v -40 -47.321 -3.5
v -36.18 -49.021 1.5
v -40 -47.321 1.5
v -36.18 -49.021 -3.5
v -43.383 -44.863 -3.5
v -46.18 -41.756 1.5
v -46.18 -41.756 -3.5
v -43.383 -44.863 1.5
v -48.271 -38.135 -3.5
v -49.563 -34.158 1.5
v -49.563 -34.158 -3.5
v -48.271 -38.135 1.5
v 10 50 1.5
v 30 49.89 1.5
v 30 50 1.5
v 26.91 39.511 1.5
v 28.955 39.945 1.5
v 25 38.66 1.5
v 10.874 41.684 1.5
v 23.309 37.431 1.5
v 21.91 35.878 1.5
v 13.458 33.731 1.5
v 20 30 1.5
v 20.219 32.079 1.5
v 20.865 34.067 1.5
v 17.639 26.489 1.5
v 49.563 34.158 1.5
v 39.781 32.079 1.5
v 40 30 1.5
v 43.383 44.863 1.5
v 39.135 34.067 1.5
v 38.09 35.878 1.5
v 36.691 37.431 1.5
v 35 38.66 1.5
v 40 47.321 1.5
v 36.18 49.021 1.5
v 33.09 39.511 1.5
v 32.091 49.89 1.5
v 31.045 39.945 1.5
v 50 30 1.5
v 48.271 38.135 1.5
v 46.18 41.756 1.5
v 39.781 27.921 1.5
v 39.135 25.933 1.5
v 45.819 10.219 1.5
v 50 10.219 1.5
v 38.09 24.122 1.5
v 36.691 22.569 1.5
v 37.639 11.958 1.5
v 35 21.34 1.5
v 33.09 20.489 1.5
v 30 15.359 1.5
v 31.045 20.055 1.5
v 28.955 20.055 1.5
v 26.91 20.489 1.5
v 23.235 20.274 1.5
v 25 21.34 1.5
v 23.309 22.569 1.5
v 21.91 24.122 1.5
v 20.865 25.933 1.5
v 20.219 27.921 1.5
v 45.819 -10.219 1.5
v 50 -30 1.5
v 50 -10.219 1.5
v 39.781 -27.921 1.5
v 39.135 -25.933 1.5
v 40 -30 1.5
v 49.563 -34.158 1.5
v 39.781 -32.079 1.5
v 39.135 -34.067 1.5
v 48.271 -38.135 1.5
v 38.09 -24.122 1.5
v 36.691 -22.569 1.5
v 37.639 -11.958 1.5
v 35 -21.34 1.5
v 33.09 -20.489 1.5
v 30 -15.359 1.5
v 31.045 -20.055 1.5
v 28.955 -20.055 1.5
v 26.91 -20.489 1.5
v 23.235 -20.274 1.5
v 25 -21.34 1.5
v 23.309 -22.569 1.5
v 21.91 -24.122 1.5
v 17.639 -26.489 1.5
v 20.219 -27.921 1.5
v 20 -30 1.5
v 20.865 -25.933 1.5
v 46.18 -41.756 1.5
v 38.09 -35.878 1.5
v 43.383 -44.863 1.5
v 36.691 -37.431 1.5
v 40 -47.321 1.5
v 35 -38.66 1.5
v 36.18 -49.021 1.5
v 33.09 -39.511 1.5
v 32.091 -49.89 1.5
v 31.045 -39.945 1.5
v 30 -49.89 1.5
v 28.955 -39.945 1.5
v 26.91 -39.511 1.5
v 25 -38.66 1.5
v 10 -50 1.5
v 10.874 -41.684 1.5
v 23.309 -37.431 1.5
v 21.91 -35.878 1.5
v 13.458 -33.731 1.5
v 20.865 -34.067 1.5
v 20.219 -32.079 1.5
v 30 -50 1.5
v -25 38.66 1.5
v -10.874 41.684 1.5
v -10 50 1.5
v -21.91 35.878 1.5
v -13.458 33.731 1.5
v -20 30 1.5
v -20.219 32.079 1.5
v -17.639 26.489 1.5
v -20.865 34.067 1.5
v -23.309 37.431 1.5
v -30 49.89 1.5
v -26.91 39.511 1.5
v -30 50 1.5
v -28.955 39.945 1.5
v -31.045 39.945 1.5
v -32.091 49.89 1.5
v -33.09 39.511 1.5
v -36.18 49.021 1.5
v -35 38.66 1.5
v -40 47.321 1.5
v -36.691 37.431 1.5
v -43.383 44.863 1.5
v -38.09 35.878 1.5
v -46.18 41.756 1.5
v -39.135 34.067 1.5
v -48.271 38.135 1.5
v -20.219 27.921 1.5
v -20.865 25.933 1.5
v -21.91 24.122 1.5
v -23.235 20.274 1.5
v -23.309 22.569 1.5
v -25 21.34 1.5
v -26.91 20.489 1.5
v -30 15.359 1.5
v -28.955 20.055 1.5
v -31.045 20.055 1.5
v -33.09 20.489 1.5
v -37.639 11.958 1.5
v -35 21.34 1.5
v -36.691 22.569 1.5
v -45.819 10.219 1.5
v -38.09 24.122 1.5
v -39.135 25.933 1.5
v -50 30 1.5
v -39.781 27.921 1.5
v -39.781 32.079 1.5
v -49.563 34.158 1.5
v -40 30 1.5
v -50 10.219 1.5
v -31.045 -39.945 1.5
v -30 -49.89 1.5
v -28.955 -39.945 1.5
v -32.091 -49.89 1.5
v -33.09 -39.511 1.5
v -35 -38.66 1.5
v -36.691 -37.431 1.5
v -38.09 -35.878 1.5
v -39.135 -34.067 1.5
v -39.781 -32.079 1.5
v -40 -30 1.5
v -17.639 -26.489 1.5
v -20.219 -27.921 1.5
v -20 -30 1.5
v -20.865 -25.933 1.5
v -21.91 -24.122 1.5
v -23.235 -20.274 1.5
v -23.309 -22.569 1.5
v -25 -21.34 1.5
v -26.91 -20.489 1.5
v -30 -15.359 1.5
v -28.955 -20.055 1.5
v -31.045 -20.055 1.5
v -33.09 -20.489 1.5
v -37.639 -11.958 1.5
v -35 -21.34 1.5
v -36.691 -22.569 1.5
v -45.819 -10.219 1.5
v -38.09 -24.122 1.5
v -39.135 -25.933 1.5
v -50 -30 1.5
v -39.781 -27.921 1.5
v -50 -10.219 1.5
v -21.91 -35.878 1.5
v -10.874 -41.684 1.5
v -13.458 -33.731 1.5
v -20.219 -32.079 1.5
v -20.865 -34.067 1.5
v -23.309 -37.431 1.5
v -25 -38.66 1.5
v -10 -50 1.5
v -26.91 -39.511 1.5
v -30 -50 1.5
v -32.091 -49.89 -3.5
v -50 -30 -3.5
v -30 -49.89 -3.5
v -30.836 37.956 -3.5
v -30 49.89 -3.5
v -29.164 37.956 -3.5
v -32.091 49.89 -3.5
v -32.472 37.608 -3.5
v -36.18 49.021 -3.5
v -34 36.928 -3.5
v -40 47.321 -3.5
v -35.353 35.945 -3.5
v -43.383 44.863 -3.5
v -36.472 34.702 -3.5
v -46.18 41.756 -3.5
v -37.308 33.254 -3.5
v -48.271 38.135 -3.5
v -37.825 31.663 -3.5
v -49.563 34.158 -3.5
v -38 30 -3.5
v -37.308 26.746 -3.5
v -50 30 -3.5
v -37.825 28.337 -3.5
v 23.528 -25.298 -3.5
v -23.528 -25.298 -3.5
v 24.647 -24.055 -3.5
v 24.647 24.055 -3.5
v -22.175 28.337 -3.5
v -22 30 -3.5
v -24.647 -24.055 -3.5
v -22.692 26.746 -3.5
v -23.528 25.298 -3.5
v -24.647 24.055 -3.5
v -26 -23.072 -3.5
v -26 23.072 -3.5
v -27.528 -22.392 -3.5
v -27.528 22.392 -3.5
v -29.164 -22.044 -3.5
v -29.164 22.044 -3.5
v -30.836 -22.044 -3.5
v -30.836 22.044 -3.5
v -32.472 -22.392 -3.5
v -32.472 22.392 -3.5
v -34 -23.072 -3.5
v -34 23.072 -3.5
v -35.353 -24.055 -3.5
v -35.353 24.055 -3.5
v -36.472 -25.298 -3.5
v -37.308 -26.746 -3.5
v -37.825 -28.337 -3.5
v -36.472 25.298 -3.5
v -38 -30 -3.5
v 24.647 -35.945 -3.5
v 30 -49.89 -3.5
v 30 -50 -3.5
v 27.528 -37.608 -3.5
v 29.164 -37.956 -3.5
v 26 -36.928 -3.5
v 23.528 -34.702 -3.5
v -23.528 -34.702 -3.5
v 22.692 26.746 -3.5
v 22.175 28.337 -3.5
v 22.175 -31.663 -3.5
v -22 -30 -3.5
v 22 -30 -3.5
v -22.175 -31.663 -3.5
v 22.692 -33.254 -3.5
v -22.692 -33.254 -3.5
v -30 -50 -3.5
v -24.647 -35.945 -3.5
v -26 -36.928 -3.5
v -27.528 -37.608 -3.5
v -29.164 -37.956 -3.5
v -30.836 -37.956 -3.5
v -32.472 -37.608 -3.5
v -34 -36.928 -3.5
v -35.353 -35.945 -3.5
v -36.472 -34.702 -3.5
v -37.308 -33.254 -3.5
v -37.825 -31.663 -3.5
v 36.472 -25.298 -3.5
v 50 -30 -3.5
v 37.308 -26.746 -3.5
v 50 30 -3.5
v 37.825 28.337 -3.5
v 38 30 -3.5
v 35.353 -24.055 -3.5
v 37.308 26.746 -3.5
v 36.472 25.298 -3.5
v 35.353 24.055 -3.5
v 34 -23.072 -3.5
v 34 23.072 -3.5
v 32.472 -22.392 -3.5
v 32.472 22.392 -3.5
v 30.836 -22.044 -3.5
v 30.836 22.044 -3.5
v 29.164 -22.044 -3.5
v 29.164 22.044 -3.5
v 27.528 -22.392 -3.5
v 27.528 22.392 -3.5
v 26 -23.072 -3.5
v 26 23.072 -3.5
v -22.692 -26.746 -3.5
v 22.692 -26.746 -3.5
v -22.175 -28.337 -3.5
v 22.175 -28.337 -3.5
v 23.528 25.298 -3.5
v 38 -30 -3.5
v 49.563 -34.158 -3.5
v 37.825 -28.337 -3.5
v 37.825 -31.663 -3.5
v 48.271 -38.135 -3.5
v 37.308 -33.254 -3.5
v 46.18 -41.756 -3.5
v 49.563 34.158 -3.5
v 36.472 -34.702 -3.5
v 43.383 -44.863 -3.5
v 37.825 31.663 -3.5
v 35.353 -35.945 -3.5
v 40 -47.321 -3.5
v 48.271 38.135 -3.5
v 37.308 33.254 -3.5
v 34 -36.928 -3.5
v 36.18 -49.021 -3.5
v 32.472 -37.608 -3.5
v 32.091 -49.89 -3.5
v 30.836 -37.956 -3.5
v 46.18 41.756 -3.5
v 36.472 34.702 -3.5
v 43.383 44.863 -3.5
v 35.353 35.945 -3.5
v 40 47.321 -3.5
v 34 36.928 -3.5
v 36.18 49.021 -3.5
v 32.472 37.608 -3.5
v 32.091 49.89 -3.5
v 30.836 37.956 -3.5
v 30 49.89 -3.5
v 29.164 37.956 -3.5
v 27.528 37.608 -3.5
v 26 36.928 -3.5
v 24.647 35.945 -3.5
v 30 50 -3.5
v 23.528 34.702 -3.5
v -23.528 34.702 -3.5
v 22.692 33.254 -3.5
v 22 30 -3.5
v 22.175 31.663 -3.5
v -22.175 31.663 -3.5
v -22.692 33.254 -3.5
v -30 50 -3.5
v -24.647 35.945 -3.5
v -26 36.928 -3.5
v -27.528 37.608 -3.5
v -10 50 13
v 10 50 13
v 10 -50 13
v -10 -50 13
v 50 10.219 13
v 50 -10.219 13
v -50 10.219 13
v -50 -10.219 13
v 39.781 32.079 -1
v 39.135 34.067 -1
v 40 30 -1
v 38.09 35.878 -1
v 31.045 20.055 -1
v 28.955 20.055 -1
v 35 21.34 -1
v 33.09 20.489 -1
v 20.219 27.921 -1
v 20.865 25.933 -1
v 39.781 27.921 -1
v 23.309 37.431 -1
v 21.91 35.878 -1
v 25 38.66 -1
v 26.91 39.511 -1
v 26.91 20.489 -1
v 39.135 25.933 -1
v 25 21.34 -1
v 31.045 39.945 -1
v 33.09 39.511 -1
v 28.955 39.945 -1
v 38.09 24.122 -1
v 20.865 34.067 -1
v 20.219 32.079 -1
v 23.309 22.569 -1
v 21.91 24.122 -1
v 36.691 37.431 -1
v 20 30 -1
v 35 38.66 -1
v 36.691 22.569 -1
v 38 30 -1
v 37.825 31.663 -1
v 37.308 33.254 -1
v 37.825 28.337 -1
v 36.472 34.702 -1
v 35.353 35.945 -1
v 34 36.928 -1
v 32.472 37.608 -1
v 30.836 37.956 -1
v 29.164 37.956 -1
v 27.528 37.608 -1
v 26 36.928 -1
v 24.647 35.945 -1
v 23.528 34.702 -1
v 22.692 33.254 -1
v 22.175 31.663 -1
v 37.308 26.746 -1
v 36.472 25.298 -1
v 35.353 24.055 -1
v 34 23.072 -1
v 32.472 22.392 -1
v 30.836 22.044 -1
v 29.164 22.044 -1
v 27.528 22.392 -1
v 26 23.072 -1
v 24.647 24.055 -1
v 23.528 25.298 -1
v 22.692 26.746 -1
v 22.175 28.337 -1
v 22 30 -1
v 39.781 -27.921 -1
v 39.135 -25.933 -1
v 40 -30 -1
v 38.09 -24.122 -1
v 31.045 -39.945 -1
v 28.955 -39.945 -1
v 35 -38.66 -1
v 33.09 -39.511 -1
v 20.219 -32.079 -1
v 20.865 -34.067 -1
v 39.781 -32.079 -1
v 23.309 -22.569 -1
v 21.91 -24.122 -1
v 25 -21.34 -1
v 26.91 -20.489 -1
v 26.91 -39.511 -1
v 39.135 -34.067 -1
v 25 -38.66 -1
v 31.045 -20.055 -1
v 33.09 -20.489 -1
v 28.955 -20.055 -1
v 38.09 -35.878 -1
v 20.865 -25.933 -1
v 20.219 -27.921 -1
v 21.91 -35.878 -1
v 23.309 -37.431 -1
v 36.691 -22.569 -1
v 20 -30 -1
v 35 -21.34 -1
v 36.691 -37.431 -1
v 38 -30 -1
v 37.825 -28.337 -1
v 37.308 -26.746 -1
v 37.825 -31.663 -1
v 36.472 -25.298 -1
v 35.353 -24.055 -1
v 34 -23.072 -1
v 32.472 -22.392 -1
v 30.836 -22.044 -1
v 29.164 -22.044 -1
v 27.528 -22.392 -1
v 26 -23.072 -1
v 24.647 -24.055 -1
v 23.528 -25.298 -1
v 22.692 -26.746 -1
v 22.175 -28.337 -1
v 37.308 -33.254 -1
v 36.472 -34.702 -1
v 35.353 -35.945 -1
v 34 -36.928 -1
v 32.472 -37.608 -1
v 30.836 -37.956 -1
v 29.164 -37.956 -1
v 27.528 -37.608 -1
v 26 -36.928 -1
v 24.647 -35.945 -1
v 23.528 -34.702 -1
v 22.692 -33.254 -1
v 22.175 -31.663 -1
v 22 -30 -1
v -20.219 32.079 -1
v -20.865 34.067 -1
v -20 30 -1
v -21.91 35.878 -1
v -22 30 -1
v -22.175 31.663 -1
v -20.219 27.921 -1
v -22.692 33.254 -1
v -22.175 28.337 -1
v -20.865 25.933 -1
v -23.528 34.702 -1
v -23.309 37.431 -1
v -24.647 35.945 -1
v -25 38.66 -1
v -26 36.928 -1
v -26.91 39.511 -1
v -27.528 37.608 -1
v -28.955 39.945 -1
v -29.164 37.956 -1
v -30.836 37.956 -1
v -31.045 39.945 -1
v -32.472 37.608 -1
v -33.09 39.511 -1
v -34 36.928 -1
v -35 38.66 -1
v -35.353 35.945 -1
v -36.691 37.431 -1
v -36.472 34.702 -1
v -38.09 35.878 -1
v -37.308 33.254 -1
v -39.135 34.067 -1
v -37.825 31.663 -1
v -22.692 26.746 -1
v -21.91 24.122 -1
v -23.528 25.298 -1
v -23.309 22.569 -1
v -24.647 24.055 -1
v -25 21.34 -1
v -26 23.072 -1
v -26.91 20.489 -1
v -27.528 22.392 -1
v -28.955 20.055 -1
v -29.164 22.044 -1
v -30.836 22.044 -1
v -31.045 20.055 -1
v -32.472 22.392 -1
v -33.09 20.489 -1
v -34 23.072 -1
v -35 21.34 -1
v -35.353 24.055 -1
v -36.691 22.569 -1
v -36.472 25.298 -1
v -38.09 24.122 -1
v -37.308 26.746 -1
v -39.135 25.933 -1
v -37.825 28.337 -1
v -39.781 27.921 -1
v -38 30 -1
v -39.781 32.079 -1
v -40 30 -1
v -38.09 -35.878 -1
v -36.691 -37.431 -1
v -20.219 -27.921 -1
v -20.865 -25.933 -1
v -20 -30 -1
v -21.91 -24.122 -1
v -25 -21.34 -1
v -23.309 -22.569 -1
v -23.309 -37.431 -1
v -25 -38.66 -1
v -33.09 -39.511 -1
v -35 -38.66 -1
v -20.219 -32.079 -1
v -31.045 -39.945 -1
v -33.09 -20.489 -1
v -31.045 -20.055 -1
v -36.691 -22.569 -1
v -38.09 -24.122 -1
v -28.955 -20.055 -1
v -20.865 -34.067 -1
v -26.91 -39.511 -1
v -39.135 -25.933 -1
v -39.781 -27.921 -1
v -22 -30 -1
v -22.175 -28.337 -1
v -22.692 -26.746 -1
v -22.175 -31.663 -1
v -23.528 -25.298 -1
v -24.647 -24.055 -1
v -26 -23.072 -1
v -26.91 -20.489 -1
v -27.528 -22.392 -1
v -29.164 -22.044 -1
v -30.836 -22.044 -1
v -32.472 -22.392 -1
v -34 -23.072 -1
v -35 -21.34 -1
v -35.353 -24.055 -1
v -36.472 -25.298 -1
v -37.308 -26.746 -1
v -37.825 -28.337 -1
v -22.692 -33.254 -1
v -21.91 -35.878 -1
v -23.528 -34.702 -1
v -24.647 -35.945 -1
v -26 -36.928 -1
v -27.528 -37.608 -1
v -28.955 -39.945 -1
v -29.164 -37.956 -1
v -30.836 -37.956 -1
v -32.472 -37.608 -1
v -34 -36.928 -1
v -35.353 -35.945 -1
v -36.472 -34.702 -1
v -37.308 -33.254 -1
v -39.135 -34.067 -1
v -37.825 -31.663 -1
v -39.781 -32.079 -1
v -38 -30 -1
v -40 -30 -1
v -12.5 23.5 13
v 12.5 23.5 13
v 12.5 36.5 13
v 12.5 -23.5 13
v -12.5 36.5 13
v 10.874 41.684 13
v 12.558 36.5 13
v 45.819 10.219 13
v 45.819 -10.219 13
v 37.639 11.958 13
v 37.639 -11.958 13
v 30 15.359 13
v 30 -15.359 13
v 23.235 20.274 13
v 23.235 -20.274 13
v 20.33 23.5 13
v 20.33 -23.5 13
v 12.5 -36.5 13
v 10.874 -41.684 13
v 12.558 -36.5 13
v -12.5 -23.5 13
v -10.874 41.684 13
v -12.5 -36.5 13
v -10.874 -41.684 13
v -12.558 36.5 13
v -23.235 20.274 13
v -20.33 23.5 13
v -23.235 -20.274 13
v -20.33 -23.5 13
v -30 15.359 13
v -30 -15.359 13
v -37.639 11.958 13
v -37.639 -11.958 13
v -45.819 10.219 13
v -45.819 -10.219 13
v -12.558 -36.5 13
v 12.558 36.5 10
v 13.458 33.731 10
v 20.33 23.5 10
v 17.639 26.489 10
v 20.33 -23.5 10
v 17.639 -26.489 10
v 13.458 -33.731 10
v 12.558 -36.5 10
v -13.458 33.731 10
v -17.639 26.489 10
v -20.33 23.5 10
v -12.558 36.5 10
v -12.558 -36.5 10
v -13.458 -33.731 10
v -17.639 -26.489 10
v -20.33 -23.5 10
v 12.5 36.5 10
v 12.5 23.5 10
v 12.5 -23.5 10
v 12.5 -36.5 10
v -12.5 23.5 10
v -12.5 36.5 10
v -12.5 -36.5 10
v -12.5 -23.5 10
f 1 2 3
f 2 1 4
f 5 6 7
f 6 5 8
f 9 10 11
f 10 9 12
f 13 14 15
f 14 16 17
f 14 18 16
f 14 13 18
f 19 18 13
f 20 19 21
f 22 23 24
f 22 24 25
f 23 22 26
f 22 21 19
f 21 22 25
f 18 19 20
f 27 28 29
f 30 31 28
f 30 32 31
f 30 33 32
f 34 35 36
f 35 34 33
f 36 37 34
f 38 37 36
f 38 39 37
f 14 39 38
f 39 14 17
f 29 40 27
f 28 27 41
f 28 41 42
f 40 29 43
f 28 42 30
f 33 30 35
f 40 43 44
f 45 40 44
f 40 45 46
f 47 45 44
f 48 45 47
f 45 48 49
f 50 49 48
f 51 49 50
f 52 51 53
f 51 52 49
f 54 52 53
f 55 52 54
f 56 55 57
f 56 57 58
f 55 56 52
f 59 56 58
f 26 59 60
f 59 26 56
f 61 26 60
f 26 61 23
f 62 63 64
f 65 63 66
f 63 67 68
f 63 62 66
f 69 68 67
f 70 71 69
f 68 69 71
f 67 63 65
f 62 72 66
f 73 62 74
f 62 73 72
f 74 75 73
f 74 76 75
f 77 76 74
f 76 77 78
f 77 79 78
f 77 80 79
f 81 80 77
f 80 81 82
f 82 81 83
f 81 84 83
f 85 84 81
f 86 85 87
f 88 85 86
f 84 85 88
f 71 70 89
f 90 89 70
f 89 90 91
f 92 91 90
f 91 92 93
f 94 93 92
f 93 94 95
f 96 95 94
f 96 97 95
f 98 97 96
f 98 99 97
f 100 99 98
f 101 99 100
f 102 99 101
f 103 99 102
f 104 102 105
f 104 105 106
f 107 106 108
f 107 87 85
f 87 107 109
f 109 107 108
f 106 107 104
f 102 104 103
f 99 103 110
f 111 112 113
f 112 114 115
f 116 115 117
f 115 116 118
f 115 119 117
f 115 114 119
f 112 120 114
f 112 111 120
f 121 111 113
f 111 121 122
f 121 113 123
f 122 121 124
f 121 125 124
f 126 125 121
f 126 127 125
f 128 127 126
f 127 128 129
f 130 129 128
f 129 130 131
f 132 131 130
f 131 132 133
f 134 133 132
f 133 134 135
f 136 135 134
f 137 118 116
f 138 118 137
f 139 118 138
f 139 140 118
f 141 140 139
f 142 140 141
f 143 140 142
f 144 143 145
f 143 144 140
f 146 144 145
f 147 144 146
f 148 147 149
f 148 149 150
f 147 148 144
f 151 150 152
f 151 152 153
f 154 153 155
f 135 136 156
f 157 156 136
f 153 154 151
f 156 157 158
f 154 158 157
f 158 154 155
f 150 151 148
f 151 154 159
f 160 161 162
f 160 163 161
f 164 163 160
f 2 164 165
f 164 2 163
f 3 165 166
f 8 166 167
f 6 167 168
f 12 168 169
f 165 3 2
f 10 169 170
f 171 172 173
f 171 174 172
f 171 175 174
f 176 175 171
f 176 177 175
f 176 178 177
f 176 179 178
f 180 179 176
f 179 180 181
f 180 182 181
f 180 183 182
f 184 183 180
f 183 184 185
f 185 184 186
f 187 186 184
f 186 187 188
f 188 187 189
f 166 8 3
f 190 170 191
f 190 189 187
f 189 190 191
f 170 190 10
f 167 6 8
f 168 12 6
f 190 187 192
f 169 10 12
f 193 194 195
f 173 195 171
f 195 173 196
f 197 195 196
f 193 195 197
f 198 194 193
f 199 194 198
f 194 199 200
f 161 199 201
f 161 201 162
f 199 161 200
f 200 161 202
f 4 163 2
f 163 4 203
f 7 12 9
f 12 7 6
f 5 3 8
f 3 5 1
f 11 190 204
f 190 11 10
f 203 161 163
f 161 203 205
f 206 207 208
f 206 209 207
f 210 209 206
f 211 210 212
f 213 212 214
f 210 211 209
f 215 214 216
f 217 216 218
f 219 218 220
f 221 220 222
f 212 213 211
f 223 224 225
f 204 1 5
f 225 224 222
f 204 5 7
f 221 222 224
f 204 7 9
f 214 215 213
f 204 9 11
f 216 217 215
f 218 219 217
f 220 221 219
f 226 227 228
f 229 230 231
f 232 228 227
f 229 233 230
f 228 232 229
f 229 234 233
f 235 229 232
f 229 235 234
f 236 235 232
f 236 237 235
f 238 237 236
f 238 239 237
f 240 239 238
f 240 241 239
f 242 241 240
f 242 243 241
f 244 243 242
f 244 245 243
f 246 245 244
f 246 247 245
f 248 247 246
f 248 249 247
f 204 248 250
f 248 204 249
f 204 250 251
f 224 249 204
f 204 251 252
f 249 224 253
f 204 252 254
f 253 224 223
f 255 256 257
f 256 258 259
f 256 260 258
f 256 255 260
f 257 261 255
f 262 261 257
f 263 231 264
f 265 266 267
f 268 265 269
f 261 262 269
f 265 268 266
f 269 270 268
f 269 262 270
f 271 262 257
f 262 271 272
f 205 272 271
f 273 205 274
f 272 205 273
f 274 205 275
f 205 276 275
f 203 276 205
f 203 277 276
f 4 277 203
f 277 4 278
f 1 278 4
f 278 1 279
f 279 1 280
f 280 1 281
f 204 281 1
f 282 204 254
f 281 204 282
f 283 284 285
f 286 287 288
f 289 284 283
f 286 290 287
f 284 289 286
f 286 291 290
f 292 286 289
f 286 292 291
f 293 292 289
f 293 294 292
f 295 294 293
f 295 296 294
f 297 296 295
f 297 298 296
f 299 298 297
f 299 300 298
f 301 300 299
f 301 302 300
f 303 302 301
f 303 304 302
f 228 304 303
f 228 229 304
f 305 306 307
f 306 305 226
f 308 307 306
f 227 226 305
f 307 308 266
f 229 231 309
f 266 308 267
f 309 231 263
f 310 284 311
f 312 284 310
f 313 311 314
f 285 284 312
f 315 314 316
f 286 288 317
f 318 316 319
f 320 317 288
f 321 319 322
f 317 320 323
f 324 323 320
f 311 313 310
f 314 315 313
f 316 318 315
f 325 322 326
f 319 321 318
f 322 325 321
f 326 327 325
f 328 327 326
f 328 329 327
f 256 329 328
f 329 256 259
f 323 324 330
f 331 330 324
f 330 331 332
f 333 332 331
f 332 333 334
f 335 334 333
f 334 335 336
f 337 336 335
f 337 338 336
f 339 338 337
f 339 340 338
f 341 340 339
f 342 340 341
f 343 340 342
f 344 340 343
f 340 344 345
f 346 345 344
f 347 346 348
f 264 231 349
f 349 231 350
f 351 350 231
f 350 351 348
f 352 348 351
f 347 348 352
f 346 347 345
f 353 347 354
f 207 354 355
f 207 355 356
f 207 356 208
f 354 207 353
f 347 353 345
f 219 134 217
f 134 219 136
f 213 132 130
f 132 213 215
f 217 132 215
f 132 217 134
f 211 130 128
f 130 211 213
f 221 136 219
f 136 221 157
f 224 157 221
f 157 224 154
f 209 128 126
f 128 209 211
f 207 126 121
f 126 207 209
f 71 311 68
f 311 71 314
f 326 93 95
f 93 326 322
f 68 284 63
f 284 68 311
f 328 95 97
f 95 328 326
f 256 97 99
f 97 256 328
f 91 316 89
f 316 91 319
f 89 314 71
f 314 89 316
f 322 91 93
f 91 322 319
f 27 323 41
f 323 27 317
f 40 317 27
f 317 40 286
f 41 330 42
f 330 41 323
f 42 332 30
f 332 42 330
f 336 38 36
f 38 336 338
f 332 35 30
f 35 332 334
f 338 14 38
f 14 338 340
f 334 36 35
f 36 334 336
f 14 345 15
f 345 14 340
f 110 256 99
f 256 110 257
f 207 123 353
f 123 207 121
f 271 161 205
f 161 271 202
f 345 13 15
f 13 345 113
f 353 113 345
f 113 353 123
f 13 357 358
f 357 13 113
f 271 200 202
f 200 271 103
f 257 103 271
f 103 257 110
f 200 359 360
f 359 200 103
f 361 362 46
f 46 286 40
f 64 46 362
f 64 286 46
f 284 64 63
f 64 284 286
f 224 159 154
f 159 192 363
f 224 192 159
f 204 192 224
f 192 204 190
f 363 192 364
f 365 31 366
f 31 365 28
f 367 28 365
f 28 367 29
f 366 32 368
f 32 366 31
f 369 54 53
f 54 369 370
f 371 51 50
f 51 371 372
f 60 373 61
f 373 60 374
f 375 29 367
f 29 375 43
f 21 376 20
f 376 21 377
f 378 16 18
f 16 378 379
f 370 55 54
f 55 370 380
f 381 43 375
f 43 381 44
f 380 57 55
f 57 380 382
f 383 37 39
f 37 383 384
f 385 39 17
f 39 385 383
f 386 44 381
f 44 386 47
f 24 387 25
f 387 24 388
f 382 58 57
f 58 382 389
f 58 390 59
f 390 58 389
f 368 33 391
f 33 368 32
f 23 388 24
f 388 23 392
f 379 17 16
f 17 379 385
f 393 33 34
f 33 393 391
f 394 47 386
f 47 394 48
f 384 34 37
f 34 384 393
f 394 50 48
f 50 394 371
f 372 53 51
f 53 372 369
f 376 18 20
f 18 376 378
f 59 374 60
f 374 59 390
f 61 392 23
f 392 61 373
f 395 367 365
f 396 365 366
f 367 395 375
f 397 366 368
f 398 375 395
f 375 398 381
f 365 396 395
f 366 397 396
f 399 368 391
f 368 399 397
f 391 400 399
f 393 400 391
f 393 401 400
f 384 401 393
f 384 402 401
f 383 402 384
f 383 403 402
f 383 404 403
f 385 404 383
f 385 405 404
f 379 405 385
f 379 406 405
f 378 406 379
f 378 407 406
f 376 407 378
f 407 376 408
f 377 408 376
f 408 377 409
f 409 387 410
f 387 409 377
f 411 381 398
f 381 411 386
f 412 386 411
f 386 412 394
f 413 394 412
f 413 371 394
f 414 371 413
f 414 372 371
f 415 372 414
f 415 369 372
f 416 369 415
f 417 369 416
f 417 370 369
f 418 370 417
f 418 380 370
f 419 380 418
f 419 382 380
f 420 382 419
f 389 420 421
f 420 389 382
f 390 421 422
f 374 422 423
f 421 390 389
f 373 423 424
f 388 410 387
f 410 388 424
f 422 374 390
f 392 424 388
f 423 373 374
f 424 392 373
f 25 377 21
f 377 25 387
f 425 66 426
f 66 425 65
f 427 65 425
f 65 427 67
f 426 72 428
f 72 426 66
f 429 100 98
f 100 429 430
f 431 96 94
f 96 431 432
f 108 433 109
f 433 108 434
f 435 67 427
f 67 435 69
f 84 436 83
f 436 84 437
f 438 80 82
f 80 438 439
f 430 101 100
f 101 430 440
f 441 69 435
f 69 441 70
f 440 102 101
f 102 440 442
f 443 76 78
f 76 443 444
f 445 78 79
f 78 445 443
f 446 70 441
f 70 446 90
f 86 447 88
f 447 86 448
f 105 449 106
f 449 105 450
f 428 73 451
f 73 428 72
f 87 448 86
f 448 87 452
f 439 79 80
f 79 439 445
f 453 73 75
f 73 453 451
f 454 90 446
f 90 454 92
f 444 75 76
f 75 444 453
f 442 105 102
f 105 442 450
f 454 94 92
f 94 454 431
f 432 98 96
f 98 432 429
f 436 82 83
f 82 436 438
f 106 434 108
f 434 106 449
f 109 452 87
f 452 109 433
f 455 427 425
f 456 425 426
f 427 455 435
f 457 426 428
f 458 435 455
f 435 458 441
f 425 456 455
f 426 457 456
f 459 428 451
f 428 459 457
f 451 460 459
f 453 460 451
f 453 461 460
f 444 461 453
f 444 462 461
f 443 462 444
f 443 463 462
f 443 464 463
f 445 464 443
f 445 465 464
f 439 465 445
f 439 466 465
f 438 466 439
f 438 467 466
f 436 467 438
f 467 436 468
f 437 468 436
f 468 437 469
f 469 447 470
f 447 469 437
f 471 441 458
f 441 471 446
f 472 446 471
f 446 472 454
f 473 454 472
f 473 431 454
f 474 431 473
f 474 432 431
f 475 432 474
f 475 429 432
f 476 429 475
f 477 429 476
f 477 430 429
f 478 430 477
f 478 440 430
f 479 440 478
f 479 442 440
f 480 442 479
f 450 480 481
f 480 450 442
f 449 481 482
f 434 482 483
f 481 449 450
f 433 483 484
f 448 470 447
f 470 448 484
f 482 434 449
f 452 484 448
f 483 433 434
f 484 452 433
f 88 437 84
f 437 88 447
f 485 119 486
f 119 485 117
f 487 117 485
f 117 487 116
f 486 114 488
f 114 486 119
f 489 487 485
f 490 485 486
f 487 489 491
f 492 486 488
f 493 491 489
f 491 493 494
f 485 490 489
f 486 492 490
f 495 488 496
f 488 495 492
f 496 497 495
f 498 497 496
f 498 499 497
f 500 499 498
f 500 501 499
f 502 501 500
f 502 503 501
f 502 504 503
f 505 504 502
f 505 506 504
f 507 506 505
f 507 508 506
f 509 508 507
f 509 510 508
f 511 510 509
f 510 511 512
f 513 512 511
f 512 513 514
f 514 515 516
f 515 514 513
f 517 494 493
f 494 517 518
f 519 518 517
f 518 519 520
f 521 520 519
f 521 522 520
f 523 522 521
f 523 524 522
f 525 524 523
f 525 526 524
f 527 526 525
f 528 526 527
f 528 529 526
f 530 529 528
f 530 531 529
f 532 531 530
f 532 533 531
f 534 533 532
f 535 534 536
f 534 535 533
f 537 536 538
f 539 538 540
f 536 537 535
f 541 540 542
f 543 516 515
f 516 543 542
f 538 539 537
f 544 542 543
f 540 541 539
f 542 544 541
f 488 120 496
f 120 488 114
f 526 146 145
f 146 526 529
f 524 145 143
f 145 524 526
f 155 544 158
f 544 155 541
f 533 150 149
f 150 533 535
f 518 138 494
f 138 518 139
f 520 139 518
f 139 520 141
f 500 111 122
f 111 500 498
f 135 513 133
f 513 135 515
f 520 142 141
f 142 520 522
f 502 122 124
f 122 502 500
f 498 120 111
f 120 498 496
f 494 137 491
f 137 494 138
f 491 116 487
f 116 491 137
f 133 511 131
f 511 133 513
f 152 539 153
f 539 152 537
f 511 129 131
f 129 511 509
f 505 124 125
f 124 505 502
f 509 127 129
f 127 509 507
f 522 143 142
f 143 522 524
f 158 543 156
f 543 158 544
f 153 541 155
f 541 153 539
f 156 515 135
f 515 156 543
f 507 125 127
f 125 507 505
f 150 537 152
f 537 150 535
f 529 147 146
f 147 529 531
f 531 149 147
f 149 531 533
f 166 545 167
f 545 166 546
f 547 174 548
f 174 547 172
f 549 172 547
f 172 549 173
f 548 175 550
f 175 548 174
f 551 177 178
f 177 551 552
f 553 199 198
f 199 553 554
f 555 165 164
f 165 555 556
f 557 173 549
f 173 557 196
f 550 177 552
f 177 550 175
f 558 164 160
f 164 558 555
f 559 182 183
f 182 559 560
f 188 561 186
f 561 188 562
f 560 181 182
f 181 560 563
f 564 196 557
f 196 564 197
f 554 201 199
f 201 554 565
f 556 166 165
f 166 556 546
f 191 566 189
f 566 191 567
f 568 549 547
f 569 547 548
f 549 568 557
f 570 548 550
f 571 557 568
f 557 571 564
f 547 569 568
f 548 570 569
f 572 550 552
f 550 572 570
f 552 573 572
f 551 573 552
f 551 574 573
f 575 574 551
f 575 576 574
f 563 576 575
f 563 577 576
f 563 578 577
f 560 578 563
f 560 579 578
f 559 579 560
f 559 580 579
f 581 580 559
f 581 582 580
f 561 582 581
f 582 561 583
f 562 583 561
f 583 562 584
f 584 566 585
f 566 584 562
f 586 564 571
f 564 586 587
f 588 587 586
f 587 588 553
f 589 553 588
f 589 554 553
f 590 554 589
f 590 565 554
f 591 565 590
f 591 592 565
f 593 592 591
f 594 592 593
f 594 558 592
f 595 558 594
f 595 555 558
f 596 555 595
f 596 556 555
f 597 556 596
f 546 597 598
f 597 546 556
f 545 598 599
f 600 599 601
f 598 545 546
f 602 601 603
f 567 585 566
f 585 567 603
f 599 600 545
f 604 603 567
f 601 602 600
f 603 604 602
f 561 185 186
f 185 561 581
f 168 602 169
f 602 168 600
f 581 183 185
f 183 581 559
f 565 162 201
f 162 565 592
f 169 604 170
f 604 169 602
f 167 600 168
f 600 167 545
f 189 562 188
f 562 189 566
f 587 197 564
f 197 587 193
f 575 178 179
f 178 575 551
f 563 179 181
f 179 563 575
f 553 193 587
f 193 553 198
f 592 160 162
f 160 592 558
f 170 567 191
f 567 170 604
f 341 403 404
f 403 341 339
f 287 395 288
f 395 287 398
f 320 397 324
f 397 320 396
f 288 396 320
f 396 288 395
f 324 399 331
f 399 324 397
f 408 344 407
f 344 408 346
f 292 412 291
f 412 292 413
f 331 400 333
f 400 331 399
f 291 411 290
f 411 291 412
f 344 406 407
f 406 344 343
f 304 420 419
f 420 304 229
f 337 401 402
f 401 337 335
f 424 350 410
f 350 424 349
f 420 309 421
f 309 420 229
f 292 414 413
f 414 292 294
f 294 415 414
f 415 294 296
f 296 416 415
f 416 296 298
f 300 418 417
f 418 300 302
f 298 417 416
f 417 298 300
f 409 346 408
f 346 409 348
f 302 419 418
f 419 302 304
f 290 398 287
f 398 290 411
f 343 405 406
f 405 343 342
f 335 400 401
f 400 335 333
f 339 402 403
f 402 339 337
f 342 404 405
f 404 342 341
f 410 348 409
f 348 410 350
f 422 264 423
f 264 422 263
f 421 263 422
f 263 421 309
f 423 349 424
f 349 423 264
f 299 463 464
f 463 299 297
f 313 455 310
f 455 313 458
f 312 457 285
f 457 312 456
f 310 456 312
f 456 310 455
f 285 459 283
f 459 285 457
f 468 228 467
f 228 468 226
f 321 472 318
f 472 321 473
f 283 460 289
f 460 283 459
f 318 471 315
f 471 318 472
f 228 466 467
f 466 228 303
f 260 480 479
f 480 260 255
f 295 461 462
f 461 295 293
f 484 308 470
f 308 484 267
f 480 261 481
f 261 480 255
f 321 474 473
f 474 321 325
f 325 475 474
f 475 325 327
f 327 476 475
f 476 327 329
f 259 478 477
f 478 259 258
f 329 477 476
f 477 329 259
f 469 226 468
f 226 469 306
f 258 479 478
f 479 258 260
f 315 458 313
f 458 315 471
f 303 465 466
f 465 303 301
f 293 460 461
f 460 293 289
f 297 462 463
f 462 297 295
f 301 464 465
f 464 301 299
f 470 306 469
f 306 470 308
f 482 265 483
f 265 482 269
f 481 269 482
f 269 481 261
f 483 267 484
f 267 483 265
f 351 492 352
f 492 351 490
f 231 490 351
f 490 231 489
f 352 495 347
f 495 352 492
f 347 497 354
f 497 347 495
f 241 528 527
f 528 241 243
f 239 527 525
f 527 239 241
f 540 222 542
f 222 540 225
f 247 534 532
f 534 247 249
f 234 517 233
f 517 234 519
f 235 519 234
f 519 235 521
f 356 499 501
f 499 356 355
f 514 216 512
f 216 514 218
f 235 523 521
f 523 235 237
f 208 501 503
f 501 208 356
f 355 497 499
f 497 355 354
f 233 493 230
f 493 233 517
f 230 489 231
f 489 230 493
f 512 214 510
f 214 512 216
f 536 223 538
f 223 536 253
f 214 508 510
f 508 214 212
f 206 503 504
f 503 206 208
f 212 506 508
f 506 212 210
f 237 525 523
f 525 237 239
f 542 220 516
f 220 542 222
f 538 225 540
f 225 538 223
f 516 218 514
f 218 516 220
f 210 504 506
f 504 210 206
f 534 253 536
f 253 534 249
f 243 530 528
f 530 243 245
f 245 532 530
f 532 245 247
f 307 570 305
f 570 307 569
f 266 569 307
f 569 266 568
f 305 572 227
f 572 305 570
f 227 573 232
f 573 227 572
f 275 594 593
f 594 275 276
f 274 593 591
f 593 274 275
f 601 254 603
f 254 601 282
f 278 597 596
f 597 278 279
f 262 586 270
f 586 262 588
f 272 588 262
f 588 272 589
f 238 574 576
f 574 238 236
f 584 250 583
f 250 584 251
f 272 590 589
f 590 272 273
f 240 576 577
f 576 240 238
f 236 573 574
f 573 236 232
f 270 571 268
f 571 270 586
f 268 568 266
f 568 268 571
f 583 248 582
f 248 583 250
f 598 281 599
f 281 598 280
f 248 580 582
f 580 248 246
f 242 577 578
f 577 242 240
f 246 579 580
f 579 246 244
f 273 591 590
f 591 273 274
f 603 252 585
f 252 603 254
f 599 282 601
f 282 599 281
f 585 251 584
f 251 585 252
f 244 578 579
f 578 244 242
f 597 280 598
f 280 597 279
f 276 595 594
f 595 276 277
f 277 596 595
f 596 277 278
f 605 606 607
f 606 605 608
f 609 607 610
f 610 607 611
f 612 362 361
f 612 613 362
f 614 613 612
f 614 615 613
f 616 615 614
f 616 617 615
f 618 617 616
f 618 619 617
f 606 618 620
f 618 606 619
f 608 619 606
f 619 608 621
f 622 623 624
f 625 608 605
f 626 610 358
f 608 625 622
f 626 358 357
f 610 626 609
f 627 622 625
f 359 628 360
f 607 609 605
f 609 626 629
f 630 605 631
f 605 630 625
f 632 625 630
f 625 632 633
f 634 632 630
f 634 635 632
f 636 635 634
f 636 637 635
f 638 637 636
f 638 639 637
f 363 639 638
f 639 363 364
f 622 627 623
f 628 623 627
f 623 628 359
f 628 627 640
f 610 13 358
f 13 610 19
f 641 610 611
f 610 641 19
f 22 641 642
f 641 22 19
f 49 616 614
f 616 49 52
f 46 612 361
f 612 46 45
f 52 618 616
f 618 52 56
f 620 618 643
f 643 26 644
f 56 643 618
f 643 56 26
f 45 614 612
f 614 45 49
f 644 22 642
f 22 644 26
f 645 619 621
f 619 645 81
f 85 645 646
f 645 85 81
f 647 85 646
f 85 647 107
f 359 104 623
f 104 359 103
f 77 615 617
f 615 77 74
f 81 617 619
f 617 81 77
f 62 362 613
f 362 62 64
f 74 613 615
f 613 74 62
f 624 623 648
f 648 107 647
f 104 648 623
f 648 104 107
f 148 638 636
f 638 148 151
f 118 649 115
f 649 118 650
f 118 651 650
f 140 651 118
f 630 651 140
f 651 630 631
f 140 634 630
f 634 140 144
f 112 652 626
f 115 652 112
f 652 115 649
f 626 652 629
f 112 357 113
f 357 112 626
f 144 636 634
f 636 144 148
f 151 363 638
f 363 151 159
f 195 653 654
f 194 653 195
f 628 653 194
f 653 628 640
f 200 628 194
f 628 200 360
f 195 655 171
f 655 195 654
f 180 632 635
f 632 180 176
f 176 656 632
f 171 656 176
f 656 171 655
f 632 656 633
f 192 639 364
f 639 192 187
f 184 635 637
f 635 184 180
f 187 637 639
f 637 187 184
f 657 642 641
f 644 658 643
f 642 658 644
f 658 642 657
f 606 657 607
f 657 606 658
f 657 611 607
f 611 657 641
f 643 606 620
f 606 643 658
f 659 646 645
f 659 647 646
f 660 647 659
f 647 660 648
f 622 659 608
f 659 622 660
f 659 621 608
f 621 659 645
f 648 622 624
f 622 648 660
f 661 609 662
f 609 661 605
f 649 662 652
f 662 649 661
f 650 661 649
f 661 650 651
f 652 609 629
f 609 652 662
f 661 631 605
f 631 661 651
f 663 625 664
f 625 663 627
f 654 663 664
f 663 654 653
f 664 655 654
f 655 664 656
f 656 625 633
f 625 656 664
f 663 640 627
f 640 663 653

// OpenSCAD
// file: ../joint_points.scad
joint_point_LF= [30,30,-2];
joint_point_RF= [30,-30,-2];

joint_point_LH= [-30,30,-2];
joint_point_RH= [-30,-30,-2];
joint_point_2 = [0,25,-14];
// main file
$fs=0.5;

use <MCAD/regular_shapes.scad>
use <MCAD/boxes.scad>

include <../joint_points.scad>

module base_1(){
    difference(){
        translate([0,0,-1])  
        roundedBox( size=[100,100,5], radius=20, sidesonly=true);
        
        translate(joint_point_LF)
        translate([0,0,1])
        cylinder(h=6, d=20);
        translate(joint_point_RF)
        translate([0,0,1])
        cylinder(h=6, d=20);
        translate(joint_point_LH)
        translate([0,0,1])
        cylinder(h=6, d=20);
        translate(joint_point_RH)
        translate([0,0,1])
        cylinder(h=6, d=20);
        
        translate(joint_point_LF)
        translate([0,0,-3])
        cylinder(h=6, d=16);
        translate(joint_point_RF)
        translate([0,0,-3])
        cylinder(h=6, d=16);
        translate(joint_point_LH)
        translate([0,0,-3])
        cylinder(h=6, d=16);
        translate(joint_point_RH)
        translate([0,0,-3])
        cylinder(h=6, d=16);
    }
    
    difference(){
        translate([0,0,7.25])
        roundedBox( size=[100,100,11.5], radius=20, sidesonly=true);
        
        translate([50,50,-1])
        cylinder(h=20, d=80);
        translate([50,-50,-1])
        cylinder(h=20, d=80);
        translate([-50,50,-1])
        cylinder(h=20, d=80);
        translate([-50,-50,-1])
        cylinder(h=20, d=80);
        
        translate(joint_point_LF)
        translate([-5.5,0,17])
        cube([24,13,10],center=true);
        
        translate(joint_point_RF)
        translate([-5.5,0,17])
        cube([24,13,10],center=true);
        
        translate(joint_point_LH)
        translate([5.5,0,17])
        cube([24,13,10],center=true);
        
        translate(joint_point_RH)
        translate([5.5,0,17])
        cube([24,13,10],center=true);
    }
}

base_1();
